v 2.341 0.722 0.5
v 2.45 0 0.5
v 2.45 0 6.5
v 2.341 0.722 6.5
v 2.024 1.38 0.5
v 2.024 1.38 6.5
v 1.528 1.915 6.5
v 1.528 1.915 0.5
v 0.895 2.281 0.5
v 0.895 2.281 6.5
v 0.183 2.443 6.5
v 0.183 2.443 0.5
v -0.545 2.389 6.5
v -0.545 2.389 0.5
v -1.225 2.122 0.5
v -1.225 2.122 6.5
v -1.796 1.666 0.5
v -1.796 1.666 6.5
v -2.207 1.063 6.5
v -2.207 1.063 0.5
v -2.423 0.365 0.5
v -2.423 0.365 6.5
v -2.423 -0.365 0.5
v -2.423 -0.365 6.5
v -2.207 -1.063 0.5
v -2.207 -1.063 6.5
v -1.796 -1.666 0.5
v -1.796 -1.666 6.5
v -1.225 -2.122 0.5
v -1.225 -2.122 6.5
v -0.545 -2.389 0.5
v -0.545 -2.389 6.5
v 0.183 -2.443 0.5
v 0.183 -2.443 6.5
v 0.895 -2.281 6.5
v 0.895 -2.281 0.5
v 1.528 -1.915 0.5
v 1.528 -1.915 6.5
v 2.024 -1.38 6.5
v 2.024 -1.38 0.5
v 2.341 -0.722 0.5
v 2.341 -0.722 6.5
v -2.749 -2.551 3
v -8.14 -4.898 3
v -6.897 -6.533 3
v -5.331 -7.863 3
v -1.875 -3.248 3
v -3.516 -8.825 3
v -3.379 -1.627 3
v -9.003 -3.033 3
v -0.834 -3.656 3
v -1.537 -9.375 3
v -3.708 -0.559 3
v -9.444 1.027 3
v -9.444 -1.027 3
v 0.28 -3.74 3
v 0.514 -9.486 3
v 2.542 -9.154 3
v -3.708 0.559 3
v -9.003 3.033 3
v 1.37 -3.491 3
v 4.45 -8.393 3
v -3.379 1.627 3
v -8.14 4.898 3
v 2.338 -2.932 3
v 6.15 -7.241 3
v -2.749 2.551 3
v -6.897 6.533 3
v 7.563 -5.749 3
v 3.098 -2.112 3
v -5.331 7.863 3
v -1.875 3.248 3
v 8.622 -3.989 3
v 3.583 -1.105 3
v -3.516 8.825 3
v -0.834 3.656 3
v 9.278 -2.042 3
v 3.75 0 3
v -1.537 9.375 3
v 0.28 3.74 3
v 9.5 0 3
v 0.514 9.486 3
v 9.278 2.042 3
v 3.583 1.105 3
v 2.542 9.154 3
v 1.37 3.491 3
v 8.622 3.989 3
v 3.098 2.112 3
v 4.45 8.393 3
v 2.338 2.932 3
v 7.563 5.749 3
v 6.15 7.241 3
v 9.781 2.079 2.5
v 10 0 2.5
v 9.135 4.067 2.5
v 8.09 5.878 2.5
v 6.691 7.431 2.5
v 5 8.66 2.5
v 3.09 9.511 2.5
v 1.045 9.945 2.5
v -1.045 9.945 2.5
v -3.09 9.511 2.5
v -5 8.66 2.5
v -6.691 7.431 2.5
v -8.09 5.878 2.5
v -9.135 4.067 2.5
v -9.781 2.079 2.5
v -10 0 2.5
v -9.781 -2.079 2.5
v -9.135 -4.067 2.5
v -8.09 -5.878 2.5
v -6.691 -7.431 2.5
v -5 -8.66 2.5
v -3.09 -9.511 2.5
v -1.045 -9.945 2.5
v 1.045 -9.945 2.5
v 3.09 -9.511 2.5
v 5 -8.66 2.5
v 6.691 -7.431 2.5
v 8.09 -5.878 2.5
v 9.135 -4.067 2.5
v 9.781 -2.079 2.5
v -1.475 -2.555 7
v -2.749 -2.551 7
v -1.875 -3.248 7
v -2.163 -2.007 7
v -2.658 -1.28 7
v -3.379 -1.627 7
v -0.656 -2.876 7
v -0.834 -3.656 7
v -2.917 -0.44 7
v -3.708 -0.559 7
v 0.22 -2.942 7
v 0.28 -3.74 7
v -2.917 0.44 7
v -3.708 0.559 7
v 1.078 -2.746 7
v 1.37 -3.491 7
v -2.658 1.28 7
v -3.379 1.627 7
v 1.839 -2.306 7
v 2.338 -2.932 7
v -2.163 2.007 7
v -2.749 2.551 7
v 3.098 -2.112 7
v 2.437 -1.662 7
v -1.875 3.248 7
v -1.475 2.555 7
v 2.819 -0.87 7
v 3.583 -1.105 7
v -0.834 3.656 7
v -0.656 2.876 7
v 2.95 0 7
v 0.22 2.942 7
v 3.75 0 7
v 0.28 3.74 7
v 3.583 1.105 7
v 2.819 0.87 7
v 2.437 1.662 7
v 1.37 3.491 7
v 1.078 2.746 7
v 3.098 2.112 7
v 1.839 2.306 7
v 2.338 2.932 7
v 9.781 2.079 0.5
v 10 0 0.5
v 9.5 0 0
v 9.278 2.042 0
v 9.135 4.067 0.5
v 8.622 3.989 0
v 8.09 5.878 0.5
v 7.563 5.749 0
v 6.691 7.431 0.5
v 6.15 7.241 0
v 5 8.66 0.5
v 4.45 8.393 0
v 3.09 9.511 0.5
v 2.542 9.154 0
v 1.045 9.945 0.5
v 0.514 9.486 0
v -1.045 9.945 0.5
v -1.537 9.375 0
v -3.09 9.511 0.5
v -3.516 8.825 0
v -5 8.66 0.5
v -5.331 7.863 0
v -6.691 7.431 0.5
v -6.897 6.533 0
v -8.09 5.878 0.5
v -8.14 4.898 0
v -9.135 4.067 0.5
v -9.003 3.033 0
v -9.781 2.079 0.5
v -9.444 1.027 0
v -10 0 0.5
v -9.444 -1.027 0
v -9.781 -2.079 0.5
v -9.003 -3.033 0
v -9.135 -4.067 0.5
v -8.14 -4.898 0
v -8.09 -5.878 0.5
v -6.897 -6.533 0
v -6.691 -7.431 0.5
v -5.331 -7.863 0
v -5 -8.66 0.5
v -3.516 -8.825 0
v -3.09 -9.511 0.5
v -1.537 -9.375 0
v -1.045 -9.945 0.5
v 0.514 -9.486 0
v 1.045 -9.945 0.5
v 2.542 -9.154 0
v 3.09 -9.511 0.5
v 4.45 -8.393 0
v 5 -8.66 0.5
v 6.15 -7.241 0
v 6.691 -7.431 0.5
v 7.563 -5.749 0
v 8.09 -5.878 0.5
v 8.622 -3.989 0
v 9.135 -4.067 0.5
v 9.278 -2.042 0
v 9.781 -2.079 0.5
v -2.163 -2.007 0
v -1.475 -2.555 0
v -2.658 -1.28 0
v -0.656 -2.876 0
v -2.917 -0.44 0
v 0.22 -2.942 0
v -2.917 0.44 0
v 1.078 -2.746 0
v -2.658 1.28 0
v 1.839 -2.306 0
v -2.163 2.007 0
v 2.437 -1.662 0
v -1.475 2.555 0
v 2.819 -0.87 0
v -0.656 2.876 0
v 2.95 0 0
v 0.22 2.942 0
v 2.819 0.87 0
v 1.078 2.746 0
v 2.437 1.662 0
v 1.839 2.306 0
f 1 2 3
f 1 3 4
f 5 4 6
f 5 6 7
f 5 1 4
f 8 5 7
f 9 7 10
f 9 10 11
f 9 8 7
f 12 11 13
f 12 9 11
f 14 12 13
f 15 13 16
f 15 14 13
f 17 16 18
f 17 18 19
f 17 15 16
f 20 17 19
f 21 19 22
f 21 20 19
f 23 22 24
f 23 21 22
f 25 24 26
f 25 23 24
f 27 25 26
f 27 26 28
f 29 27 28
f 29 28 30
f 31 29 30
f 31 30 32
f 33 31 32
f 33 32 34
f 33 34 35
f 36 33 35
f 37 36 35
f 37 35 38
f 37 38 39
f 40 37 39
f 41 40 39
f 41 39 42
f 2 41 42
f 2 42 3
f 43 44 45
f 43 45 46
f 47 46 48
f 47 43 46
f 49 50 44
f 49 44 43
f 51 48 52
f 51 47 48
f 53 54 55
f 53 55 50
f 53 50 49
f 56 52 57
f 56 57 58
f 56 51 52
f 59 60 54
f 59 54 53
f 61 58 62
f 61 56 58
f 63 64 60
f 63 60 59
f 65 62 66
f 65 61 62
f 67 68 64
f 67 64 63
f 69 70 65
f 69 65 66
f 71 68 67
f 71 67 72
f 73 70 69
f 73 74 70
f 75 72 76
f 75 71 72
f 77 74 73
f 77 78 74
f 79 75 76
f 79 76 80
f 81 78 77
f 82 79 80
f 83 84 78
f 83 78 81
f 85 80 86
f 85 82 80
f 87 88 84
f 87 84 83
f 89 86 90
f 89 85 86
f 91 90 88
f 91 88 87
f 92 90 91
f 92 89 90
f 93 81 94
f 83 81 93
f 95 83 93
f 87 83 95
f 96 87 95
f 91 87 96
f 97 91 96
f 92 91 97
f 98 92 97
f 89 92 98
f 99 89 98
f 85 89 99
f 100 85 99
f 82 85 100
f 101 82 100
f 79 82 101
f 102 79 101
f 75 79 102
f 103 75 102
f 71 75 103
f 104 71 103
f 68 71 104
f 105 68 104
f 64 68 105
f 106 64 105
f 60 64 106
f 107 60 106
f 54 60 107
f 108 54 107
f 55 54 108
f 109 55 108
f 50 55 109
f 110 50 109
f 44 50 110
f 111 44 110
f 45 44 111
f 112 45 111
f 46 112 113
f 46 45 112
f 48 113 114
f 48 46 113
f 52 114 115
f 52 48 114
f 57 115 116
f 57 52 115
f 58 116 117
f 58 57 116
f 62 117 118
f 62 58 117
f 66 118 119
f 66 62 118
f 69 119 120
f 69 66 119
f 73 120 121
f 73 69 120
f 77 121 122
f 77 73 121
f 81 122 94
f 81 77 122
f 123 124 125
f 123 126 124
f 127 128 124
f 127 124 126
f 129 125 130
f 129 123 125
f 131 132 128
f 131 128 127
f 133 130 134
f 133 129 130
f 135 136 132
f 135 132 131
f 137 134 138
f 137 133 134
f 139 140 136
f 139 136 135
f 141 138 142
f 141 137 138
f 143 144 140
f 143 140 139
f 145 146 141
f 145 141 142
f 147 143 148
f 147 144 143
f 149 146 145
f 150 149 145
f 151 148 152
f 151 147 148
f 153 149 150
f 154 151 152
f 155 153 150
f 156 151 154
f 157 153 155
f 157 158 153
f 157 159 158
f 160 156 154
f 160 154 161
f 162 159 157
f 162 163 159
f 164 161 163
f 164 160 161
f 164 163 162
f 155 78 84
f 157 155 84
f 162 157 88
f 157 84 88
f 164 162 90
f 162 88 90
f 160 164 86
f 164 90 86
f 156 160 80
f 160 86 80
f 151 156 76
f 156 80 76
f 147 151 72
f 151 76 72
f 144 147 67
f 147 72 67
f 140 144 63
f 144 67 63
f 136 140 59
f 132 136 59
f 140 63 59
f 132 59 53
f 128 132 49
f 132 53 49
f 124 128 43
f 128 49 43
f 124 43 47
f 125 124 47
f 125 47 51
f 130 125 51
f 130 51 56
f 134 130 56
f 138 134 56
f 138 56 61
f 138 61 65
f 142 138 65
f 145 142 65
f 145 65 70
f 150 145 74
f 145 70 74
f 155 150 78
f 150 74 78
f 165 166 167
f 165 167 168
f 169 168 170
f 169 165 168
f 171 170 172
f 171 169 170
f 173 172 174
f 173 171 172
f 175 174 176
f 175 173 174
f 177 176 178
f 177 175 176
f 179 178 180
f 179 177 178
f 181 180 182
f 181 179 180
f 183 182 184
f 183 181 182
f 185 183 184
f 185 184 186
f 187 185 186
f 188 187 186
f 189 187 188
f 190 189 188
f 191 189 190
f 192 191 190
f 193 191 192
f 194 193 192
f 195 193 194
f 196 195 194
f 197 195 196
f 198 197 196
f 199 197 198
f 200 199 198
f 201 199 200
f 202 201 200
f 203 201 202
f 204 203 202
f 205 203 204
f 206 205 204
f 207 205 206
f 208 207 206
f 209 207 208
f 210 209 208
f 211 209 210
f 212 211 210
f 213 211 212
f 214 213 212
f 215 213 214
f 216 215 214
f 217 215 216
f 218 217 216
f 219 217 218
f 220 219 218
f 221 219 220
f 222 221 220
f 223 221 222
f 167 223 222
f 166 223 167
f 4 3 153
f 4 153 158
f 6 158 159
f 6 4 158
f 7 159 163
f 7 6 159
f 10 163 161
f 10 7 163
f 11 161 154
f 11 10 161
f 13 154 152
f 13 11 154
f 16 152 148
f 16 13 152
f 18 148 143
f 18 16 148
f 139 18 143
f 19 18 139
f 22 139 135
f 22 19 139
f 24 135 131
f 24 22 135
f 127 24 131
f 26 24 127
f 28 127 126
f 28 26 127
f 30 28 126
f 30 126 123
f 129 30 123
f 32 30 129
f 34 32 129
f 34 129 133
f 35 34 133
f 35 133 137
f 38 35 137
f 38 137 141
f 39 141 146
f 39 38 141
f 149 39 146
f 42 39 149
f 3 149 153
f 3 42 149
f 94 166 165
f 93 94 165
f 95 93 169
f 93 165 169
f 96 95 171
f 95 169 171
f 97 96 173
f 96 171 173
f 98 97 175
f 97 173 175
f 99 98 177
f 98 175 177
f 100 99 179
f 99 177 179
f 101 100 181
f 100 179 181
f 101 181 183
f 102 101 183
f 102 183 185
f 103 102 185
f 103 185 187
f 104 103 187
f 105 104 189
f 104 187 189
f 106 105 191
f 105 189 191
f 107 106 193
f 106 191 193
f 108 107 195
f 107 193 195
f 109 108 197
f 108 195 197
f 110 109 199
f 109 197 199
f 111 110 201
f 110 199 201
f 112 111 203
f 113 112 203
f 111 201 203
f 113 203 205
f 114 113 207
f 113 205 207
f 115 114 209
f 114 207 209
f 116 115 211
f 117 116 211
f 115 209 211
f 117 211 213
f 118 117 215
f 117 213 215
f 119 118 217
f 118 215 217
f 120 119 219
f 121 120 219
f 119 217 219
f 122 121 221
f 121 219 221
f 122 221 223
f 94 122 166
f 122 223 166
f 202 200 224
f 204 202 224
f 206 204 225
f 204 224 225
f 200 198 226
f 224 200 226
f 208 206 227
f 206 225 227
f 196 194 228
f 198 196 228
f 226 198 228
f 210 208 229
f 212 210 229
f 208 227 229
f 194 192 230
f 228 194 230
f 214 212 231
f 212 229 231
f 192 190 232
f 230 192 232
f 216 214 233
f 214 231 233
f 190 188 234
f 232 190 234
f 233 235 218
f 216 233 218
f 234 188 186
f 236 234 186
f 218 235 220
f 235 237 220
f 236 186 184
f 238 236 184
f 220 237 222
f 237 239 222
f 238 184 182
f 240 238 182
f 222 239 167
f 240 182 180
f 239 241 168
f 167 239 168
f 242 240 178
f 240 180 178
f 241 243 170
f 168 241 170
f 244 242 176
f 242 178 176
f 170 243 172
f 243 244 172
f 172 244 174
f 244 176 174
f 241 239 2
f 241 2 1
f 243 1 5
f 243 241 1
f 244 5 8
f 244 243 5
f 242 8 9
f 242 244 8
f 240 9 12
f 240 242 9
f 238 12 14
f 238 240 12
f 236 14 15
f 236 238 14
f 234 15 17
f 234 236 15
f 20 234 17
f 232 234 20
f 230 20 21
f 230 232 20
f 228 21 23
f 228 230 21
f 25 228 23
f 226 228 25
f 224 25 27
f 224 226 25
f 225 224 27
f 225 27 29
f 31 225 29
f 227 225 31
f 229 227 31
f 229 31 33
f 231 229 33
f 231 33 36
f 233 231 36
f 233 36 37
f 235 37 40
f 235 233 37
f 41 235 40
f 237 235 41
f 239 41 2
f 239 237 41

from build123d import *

# Parameters (mm, degrees)
F0_R     = 10
F0_R_2   = 2.45
F1_DEPTH = 3
F2_R     = 3.75
F2_R_2   = 2.45
F3_DEPTH = 4
F4_SIZE  = 0.5


with BuildPart() as f1:
    # F0 (on Top) → F1 (new body)
    with BuildSketch(Plane.XY):
        Circle(F0_R)
        Circle(F0_R_2, mode=Mode.SUBTRACT)
    extrude(amount=F1_DEPTH)

    # F2 (on face) → F3 (join)
    with BuildSketch(Plane.XY.offset(3)):
        Circle(F2_R)
        Circle(F2_R_2, mode=Mode.SUBTRACT)
    extrude(amount=F3_DEPTH)

    # F4
    f4_edges = [f1.edges().sort_by_distance(p)[0] for p in [
        (-10, 0, 3),
        (-2.45, 0, 7),
        (-10, 0, 0),
        (-2.45, 0, 0),
    ]]
    chamfer(f4_edges, length=F4_SIZE)


solid = f1.part
